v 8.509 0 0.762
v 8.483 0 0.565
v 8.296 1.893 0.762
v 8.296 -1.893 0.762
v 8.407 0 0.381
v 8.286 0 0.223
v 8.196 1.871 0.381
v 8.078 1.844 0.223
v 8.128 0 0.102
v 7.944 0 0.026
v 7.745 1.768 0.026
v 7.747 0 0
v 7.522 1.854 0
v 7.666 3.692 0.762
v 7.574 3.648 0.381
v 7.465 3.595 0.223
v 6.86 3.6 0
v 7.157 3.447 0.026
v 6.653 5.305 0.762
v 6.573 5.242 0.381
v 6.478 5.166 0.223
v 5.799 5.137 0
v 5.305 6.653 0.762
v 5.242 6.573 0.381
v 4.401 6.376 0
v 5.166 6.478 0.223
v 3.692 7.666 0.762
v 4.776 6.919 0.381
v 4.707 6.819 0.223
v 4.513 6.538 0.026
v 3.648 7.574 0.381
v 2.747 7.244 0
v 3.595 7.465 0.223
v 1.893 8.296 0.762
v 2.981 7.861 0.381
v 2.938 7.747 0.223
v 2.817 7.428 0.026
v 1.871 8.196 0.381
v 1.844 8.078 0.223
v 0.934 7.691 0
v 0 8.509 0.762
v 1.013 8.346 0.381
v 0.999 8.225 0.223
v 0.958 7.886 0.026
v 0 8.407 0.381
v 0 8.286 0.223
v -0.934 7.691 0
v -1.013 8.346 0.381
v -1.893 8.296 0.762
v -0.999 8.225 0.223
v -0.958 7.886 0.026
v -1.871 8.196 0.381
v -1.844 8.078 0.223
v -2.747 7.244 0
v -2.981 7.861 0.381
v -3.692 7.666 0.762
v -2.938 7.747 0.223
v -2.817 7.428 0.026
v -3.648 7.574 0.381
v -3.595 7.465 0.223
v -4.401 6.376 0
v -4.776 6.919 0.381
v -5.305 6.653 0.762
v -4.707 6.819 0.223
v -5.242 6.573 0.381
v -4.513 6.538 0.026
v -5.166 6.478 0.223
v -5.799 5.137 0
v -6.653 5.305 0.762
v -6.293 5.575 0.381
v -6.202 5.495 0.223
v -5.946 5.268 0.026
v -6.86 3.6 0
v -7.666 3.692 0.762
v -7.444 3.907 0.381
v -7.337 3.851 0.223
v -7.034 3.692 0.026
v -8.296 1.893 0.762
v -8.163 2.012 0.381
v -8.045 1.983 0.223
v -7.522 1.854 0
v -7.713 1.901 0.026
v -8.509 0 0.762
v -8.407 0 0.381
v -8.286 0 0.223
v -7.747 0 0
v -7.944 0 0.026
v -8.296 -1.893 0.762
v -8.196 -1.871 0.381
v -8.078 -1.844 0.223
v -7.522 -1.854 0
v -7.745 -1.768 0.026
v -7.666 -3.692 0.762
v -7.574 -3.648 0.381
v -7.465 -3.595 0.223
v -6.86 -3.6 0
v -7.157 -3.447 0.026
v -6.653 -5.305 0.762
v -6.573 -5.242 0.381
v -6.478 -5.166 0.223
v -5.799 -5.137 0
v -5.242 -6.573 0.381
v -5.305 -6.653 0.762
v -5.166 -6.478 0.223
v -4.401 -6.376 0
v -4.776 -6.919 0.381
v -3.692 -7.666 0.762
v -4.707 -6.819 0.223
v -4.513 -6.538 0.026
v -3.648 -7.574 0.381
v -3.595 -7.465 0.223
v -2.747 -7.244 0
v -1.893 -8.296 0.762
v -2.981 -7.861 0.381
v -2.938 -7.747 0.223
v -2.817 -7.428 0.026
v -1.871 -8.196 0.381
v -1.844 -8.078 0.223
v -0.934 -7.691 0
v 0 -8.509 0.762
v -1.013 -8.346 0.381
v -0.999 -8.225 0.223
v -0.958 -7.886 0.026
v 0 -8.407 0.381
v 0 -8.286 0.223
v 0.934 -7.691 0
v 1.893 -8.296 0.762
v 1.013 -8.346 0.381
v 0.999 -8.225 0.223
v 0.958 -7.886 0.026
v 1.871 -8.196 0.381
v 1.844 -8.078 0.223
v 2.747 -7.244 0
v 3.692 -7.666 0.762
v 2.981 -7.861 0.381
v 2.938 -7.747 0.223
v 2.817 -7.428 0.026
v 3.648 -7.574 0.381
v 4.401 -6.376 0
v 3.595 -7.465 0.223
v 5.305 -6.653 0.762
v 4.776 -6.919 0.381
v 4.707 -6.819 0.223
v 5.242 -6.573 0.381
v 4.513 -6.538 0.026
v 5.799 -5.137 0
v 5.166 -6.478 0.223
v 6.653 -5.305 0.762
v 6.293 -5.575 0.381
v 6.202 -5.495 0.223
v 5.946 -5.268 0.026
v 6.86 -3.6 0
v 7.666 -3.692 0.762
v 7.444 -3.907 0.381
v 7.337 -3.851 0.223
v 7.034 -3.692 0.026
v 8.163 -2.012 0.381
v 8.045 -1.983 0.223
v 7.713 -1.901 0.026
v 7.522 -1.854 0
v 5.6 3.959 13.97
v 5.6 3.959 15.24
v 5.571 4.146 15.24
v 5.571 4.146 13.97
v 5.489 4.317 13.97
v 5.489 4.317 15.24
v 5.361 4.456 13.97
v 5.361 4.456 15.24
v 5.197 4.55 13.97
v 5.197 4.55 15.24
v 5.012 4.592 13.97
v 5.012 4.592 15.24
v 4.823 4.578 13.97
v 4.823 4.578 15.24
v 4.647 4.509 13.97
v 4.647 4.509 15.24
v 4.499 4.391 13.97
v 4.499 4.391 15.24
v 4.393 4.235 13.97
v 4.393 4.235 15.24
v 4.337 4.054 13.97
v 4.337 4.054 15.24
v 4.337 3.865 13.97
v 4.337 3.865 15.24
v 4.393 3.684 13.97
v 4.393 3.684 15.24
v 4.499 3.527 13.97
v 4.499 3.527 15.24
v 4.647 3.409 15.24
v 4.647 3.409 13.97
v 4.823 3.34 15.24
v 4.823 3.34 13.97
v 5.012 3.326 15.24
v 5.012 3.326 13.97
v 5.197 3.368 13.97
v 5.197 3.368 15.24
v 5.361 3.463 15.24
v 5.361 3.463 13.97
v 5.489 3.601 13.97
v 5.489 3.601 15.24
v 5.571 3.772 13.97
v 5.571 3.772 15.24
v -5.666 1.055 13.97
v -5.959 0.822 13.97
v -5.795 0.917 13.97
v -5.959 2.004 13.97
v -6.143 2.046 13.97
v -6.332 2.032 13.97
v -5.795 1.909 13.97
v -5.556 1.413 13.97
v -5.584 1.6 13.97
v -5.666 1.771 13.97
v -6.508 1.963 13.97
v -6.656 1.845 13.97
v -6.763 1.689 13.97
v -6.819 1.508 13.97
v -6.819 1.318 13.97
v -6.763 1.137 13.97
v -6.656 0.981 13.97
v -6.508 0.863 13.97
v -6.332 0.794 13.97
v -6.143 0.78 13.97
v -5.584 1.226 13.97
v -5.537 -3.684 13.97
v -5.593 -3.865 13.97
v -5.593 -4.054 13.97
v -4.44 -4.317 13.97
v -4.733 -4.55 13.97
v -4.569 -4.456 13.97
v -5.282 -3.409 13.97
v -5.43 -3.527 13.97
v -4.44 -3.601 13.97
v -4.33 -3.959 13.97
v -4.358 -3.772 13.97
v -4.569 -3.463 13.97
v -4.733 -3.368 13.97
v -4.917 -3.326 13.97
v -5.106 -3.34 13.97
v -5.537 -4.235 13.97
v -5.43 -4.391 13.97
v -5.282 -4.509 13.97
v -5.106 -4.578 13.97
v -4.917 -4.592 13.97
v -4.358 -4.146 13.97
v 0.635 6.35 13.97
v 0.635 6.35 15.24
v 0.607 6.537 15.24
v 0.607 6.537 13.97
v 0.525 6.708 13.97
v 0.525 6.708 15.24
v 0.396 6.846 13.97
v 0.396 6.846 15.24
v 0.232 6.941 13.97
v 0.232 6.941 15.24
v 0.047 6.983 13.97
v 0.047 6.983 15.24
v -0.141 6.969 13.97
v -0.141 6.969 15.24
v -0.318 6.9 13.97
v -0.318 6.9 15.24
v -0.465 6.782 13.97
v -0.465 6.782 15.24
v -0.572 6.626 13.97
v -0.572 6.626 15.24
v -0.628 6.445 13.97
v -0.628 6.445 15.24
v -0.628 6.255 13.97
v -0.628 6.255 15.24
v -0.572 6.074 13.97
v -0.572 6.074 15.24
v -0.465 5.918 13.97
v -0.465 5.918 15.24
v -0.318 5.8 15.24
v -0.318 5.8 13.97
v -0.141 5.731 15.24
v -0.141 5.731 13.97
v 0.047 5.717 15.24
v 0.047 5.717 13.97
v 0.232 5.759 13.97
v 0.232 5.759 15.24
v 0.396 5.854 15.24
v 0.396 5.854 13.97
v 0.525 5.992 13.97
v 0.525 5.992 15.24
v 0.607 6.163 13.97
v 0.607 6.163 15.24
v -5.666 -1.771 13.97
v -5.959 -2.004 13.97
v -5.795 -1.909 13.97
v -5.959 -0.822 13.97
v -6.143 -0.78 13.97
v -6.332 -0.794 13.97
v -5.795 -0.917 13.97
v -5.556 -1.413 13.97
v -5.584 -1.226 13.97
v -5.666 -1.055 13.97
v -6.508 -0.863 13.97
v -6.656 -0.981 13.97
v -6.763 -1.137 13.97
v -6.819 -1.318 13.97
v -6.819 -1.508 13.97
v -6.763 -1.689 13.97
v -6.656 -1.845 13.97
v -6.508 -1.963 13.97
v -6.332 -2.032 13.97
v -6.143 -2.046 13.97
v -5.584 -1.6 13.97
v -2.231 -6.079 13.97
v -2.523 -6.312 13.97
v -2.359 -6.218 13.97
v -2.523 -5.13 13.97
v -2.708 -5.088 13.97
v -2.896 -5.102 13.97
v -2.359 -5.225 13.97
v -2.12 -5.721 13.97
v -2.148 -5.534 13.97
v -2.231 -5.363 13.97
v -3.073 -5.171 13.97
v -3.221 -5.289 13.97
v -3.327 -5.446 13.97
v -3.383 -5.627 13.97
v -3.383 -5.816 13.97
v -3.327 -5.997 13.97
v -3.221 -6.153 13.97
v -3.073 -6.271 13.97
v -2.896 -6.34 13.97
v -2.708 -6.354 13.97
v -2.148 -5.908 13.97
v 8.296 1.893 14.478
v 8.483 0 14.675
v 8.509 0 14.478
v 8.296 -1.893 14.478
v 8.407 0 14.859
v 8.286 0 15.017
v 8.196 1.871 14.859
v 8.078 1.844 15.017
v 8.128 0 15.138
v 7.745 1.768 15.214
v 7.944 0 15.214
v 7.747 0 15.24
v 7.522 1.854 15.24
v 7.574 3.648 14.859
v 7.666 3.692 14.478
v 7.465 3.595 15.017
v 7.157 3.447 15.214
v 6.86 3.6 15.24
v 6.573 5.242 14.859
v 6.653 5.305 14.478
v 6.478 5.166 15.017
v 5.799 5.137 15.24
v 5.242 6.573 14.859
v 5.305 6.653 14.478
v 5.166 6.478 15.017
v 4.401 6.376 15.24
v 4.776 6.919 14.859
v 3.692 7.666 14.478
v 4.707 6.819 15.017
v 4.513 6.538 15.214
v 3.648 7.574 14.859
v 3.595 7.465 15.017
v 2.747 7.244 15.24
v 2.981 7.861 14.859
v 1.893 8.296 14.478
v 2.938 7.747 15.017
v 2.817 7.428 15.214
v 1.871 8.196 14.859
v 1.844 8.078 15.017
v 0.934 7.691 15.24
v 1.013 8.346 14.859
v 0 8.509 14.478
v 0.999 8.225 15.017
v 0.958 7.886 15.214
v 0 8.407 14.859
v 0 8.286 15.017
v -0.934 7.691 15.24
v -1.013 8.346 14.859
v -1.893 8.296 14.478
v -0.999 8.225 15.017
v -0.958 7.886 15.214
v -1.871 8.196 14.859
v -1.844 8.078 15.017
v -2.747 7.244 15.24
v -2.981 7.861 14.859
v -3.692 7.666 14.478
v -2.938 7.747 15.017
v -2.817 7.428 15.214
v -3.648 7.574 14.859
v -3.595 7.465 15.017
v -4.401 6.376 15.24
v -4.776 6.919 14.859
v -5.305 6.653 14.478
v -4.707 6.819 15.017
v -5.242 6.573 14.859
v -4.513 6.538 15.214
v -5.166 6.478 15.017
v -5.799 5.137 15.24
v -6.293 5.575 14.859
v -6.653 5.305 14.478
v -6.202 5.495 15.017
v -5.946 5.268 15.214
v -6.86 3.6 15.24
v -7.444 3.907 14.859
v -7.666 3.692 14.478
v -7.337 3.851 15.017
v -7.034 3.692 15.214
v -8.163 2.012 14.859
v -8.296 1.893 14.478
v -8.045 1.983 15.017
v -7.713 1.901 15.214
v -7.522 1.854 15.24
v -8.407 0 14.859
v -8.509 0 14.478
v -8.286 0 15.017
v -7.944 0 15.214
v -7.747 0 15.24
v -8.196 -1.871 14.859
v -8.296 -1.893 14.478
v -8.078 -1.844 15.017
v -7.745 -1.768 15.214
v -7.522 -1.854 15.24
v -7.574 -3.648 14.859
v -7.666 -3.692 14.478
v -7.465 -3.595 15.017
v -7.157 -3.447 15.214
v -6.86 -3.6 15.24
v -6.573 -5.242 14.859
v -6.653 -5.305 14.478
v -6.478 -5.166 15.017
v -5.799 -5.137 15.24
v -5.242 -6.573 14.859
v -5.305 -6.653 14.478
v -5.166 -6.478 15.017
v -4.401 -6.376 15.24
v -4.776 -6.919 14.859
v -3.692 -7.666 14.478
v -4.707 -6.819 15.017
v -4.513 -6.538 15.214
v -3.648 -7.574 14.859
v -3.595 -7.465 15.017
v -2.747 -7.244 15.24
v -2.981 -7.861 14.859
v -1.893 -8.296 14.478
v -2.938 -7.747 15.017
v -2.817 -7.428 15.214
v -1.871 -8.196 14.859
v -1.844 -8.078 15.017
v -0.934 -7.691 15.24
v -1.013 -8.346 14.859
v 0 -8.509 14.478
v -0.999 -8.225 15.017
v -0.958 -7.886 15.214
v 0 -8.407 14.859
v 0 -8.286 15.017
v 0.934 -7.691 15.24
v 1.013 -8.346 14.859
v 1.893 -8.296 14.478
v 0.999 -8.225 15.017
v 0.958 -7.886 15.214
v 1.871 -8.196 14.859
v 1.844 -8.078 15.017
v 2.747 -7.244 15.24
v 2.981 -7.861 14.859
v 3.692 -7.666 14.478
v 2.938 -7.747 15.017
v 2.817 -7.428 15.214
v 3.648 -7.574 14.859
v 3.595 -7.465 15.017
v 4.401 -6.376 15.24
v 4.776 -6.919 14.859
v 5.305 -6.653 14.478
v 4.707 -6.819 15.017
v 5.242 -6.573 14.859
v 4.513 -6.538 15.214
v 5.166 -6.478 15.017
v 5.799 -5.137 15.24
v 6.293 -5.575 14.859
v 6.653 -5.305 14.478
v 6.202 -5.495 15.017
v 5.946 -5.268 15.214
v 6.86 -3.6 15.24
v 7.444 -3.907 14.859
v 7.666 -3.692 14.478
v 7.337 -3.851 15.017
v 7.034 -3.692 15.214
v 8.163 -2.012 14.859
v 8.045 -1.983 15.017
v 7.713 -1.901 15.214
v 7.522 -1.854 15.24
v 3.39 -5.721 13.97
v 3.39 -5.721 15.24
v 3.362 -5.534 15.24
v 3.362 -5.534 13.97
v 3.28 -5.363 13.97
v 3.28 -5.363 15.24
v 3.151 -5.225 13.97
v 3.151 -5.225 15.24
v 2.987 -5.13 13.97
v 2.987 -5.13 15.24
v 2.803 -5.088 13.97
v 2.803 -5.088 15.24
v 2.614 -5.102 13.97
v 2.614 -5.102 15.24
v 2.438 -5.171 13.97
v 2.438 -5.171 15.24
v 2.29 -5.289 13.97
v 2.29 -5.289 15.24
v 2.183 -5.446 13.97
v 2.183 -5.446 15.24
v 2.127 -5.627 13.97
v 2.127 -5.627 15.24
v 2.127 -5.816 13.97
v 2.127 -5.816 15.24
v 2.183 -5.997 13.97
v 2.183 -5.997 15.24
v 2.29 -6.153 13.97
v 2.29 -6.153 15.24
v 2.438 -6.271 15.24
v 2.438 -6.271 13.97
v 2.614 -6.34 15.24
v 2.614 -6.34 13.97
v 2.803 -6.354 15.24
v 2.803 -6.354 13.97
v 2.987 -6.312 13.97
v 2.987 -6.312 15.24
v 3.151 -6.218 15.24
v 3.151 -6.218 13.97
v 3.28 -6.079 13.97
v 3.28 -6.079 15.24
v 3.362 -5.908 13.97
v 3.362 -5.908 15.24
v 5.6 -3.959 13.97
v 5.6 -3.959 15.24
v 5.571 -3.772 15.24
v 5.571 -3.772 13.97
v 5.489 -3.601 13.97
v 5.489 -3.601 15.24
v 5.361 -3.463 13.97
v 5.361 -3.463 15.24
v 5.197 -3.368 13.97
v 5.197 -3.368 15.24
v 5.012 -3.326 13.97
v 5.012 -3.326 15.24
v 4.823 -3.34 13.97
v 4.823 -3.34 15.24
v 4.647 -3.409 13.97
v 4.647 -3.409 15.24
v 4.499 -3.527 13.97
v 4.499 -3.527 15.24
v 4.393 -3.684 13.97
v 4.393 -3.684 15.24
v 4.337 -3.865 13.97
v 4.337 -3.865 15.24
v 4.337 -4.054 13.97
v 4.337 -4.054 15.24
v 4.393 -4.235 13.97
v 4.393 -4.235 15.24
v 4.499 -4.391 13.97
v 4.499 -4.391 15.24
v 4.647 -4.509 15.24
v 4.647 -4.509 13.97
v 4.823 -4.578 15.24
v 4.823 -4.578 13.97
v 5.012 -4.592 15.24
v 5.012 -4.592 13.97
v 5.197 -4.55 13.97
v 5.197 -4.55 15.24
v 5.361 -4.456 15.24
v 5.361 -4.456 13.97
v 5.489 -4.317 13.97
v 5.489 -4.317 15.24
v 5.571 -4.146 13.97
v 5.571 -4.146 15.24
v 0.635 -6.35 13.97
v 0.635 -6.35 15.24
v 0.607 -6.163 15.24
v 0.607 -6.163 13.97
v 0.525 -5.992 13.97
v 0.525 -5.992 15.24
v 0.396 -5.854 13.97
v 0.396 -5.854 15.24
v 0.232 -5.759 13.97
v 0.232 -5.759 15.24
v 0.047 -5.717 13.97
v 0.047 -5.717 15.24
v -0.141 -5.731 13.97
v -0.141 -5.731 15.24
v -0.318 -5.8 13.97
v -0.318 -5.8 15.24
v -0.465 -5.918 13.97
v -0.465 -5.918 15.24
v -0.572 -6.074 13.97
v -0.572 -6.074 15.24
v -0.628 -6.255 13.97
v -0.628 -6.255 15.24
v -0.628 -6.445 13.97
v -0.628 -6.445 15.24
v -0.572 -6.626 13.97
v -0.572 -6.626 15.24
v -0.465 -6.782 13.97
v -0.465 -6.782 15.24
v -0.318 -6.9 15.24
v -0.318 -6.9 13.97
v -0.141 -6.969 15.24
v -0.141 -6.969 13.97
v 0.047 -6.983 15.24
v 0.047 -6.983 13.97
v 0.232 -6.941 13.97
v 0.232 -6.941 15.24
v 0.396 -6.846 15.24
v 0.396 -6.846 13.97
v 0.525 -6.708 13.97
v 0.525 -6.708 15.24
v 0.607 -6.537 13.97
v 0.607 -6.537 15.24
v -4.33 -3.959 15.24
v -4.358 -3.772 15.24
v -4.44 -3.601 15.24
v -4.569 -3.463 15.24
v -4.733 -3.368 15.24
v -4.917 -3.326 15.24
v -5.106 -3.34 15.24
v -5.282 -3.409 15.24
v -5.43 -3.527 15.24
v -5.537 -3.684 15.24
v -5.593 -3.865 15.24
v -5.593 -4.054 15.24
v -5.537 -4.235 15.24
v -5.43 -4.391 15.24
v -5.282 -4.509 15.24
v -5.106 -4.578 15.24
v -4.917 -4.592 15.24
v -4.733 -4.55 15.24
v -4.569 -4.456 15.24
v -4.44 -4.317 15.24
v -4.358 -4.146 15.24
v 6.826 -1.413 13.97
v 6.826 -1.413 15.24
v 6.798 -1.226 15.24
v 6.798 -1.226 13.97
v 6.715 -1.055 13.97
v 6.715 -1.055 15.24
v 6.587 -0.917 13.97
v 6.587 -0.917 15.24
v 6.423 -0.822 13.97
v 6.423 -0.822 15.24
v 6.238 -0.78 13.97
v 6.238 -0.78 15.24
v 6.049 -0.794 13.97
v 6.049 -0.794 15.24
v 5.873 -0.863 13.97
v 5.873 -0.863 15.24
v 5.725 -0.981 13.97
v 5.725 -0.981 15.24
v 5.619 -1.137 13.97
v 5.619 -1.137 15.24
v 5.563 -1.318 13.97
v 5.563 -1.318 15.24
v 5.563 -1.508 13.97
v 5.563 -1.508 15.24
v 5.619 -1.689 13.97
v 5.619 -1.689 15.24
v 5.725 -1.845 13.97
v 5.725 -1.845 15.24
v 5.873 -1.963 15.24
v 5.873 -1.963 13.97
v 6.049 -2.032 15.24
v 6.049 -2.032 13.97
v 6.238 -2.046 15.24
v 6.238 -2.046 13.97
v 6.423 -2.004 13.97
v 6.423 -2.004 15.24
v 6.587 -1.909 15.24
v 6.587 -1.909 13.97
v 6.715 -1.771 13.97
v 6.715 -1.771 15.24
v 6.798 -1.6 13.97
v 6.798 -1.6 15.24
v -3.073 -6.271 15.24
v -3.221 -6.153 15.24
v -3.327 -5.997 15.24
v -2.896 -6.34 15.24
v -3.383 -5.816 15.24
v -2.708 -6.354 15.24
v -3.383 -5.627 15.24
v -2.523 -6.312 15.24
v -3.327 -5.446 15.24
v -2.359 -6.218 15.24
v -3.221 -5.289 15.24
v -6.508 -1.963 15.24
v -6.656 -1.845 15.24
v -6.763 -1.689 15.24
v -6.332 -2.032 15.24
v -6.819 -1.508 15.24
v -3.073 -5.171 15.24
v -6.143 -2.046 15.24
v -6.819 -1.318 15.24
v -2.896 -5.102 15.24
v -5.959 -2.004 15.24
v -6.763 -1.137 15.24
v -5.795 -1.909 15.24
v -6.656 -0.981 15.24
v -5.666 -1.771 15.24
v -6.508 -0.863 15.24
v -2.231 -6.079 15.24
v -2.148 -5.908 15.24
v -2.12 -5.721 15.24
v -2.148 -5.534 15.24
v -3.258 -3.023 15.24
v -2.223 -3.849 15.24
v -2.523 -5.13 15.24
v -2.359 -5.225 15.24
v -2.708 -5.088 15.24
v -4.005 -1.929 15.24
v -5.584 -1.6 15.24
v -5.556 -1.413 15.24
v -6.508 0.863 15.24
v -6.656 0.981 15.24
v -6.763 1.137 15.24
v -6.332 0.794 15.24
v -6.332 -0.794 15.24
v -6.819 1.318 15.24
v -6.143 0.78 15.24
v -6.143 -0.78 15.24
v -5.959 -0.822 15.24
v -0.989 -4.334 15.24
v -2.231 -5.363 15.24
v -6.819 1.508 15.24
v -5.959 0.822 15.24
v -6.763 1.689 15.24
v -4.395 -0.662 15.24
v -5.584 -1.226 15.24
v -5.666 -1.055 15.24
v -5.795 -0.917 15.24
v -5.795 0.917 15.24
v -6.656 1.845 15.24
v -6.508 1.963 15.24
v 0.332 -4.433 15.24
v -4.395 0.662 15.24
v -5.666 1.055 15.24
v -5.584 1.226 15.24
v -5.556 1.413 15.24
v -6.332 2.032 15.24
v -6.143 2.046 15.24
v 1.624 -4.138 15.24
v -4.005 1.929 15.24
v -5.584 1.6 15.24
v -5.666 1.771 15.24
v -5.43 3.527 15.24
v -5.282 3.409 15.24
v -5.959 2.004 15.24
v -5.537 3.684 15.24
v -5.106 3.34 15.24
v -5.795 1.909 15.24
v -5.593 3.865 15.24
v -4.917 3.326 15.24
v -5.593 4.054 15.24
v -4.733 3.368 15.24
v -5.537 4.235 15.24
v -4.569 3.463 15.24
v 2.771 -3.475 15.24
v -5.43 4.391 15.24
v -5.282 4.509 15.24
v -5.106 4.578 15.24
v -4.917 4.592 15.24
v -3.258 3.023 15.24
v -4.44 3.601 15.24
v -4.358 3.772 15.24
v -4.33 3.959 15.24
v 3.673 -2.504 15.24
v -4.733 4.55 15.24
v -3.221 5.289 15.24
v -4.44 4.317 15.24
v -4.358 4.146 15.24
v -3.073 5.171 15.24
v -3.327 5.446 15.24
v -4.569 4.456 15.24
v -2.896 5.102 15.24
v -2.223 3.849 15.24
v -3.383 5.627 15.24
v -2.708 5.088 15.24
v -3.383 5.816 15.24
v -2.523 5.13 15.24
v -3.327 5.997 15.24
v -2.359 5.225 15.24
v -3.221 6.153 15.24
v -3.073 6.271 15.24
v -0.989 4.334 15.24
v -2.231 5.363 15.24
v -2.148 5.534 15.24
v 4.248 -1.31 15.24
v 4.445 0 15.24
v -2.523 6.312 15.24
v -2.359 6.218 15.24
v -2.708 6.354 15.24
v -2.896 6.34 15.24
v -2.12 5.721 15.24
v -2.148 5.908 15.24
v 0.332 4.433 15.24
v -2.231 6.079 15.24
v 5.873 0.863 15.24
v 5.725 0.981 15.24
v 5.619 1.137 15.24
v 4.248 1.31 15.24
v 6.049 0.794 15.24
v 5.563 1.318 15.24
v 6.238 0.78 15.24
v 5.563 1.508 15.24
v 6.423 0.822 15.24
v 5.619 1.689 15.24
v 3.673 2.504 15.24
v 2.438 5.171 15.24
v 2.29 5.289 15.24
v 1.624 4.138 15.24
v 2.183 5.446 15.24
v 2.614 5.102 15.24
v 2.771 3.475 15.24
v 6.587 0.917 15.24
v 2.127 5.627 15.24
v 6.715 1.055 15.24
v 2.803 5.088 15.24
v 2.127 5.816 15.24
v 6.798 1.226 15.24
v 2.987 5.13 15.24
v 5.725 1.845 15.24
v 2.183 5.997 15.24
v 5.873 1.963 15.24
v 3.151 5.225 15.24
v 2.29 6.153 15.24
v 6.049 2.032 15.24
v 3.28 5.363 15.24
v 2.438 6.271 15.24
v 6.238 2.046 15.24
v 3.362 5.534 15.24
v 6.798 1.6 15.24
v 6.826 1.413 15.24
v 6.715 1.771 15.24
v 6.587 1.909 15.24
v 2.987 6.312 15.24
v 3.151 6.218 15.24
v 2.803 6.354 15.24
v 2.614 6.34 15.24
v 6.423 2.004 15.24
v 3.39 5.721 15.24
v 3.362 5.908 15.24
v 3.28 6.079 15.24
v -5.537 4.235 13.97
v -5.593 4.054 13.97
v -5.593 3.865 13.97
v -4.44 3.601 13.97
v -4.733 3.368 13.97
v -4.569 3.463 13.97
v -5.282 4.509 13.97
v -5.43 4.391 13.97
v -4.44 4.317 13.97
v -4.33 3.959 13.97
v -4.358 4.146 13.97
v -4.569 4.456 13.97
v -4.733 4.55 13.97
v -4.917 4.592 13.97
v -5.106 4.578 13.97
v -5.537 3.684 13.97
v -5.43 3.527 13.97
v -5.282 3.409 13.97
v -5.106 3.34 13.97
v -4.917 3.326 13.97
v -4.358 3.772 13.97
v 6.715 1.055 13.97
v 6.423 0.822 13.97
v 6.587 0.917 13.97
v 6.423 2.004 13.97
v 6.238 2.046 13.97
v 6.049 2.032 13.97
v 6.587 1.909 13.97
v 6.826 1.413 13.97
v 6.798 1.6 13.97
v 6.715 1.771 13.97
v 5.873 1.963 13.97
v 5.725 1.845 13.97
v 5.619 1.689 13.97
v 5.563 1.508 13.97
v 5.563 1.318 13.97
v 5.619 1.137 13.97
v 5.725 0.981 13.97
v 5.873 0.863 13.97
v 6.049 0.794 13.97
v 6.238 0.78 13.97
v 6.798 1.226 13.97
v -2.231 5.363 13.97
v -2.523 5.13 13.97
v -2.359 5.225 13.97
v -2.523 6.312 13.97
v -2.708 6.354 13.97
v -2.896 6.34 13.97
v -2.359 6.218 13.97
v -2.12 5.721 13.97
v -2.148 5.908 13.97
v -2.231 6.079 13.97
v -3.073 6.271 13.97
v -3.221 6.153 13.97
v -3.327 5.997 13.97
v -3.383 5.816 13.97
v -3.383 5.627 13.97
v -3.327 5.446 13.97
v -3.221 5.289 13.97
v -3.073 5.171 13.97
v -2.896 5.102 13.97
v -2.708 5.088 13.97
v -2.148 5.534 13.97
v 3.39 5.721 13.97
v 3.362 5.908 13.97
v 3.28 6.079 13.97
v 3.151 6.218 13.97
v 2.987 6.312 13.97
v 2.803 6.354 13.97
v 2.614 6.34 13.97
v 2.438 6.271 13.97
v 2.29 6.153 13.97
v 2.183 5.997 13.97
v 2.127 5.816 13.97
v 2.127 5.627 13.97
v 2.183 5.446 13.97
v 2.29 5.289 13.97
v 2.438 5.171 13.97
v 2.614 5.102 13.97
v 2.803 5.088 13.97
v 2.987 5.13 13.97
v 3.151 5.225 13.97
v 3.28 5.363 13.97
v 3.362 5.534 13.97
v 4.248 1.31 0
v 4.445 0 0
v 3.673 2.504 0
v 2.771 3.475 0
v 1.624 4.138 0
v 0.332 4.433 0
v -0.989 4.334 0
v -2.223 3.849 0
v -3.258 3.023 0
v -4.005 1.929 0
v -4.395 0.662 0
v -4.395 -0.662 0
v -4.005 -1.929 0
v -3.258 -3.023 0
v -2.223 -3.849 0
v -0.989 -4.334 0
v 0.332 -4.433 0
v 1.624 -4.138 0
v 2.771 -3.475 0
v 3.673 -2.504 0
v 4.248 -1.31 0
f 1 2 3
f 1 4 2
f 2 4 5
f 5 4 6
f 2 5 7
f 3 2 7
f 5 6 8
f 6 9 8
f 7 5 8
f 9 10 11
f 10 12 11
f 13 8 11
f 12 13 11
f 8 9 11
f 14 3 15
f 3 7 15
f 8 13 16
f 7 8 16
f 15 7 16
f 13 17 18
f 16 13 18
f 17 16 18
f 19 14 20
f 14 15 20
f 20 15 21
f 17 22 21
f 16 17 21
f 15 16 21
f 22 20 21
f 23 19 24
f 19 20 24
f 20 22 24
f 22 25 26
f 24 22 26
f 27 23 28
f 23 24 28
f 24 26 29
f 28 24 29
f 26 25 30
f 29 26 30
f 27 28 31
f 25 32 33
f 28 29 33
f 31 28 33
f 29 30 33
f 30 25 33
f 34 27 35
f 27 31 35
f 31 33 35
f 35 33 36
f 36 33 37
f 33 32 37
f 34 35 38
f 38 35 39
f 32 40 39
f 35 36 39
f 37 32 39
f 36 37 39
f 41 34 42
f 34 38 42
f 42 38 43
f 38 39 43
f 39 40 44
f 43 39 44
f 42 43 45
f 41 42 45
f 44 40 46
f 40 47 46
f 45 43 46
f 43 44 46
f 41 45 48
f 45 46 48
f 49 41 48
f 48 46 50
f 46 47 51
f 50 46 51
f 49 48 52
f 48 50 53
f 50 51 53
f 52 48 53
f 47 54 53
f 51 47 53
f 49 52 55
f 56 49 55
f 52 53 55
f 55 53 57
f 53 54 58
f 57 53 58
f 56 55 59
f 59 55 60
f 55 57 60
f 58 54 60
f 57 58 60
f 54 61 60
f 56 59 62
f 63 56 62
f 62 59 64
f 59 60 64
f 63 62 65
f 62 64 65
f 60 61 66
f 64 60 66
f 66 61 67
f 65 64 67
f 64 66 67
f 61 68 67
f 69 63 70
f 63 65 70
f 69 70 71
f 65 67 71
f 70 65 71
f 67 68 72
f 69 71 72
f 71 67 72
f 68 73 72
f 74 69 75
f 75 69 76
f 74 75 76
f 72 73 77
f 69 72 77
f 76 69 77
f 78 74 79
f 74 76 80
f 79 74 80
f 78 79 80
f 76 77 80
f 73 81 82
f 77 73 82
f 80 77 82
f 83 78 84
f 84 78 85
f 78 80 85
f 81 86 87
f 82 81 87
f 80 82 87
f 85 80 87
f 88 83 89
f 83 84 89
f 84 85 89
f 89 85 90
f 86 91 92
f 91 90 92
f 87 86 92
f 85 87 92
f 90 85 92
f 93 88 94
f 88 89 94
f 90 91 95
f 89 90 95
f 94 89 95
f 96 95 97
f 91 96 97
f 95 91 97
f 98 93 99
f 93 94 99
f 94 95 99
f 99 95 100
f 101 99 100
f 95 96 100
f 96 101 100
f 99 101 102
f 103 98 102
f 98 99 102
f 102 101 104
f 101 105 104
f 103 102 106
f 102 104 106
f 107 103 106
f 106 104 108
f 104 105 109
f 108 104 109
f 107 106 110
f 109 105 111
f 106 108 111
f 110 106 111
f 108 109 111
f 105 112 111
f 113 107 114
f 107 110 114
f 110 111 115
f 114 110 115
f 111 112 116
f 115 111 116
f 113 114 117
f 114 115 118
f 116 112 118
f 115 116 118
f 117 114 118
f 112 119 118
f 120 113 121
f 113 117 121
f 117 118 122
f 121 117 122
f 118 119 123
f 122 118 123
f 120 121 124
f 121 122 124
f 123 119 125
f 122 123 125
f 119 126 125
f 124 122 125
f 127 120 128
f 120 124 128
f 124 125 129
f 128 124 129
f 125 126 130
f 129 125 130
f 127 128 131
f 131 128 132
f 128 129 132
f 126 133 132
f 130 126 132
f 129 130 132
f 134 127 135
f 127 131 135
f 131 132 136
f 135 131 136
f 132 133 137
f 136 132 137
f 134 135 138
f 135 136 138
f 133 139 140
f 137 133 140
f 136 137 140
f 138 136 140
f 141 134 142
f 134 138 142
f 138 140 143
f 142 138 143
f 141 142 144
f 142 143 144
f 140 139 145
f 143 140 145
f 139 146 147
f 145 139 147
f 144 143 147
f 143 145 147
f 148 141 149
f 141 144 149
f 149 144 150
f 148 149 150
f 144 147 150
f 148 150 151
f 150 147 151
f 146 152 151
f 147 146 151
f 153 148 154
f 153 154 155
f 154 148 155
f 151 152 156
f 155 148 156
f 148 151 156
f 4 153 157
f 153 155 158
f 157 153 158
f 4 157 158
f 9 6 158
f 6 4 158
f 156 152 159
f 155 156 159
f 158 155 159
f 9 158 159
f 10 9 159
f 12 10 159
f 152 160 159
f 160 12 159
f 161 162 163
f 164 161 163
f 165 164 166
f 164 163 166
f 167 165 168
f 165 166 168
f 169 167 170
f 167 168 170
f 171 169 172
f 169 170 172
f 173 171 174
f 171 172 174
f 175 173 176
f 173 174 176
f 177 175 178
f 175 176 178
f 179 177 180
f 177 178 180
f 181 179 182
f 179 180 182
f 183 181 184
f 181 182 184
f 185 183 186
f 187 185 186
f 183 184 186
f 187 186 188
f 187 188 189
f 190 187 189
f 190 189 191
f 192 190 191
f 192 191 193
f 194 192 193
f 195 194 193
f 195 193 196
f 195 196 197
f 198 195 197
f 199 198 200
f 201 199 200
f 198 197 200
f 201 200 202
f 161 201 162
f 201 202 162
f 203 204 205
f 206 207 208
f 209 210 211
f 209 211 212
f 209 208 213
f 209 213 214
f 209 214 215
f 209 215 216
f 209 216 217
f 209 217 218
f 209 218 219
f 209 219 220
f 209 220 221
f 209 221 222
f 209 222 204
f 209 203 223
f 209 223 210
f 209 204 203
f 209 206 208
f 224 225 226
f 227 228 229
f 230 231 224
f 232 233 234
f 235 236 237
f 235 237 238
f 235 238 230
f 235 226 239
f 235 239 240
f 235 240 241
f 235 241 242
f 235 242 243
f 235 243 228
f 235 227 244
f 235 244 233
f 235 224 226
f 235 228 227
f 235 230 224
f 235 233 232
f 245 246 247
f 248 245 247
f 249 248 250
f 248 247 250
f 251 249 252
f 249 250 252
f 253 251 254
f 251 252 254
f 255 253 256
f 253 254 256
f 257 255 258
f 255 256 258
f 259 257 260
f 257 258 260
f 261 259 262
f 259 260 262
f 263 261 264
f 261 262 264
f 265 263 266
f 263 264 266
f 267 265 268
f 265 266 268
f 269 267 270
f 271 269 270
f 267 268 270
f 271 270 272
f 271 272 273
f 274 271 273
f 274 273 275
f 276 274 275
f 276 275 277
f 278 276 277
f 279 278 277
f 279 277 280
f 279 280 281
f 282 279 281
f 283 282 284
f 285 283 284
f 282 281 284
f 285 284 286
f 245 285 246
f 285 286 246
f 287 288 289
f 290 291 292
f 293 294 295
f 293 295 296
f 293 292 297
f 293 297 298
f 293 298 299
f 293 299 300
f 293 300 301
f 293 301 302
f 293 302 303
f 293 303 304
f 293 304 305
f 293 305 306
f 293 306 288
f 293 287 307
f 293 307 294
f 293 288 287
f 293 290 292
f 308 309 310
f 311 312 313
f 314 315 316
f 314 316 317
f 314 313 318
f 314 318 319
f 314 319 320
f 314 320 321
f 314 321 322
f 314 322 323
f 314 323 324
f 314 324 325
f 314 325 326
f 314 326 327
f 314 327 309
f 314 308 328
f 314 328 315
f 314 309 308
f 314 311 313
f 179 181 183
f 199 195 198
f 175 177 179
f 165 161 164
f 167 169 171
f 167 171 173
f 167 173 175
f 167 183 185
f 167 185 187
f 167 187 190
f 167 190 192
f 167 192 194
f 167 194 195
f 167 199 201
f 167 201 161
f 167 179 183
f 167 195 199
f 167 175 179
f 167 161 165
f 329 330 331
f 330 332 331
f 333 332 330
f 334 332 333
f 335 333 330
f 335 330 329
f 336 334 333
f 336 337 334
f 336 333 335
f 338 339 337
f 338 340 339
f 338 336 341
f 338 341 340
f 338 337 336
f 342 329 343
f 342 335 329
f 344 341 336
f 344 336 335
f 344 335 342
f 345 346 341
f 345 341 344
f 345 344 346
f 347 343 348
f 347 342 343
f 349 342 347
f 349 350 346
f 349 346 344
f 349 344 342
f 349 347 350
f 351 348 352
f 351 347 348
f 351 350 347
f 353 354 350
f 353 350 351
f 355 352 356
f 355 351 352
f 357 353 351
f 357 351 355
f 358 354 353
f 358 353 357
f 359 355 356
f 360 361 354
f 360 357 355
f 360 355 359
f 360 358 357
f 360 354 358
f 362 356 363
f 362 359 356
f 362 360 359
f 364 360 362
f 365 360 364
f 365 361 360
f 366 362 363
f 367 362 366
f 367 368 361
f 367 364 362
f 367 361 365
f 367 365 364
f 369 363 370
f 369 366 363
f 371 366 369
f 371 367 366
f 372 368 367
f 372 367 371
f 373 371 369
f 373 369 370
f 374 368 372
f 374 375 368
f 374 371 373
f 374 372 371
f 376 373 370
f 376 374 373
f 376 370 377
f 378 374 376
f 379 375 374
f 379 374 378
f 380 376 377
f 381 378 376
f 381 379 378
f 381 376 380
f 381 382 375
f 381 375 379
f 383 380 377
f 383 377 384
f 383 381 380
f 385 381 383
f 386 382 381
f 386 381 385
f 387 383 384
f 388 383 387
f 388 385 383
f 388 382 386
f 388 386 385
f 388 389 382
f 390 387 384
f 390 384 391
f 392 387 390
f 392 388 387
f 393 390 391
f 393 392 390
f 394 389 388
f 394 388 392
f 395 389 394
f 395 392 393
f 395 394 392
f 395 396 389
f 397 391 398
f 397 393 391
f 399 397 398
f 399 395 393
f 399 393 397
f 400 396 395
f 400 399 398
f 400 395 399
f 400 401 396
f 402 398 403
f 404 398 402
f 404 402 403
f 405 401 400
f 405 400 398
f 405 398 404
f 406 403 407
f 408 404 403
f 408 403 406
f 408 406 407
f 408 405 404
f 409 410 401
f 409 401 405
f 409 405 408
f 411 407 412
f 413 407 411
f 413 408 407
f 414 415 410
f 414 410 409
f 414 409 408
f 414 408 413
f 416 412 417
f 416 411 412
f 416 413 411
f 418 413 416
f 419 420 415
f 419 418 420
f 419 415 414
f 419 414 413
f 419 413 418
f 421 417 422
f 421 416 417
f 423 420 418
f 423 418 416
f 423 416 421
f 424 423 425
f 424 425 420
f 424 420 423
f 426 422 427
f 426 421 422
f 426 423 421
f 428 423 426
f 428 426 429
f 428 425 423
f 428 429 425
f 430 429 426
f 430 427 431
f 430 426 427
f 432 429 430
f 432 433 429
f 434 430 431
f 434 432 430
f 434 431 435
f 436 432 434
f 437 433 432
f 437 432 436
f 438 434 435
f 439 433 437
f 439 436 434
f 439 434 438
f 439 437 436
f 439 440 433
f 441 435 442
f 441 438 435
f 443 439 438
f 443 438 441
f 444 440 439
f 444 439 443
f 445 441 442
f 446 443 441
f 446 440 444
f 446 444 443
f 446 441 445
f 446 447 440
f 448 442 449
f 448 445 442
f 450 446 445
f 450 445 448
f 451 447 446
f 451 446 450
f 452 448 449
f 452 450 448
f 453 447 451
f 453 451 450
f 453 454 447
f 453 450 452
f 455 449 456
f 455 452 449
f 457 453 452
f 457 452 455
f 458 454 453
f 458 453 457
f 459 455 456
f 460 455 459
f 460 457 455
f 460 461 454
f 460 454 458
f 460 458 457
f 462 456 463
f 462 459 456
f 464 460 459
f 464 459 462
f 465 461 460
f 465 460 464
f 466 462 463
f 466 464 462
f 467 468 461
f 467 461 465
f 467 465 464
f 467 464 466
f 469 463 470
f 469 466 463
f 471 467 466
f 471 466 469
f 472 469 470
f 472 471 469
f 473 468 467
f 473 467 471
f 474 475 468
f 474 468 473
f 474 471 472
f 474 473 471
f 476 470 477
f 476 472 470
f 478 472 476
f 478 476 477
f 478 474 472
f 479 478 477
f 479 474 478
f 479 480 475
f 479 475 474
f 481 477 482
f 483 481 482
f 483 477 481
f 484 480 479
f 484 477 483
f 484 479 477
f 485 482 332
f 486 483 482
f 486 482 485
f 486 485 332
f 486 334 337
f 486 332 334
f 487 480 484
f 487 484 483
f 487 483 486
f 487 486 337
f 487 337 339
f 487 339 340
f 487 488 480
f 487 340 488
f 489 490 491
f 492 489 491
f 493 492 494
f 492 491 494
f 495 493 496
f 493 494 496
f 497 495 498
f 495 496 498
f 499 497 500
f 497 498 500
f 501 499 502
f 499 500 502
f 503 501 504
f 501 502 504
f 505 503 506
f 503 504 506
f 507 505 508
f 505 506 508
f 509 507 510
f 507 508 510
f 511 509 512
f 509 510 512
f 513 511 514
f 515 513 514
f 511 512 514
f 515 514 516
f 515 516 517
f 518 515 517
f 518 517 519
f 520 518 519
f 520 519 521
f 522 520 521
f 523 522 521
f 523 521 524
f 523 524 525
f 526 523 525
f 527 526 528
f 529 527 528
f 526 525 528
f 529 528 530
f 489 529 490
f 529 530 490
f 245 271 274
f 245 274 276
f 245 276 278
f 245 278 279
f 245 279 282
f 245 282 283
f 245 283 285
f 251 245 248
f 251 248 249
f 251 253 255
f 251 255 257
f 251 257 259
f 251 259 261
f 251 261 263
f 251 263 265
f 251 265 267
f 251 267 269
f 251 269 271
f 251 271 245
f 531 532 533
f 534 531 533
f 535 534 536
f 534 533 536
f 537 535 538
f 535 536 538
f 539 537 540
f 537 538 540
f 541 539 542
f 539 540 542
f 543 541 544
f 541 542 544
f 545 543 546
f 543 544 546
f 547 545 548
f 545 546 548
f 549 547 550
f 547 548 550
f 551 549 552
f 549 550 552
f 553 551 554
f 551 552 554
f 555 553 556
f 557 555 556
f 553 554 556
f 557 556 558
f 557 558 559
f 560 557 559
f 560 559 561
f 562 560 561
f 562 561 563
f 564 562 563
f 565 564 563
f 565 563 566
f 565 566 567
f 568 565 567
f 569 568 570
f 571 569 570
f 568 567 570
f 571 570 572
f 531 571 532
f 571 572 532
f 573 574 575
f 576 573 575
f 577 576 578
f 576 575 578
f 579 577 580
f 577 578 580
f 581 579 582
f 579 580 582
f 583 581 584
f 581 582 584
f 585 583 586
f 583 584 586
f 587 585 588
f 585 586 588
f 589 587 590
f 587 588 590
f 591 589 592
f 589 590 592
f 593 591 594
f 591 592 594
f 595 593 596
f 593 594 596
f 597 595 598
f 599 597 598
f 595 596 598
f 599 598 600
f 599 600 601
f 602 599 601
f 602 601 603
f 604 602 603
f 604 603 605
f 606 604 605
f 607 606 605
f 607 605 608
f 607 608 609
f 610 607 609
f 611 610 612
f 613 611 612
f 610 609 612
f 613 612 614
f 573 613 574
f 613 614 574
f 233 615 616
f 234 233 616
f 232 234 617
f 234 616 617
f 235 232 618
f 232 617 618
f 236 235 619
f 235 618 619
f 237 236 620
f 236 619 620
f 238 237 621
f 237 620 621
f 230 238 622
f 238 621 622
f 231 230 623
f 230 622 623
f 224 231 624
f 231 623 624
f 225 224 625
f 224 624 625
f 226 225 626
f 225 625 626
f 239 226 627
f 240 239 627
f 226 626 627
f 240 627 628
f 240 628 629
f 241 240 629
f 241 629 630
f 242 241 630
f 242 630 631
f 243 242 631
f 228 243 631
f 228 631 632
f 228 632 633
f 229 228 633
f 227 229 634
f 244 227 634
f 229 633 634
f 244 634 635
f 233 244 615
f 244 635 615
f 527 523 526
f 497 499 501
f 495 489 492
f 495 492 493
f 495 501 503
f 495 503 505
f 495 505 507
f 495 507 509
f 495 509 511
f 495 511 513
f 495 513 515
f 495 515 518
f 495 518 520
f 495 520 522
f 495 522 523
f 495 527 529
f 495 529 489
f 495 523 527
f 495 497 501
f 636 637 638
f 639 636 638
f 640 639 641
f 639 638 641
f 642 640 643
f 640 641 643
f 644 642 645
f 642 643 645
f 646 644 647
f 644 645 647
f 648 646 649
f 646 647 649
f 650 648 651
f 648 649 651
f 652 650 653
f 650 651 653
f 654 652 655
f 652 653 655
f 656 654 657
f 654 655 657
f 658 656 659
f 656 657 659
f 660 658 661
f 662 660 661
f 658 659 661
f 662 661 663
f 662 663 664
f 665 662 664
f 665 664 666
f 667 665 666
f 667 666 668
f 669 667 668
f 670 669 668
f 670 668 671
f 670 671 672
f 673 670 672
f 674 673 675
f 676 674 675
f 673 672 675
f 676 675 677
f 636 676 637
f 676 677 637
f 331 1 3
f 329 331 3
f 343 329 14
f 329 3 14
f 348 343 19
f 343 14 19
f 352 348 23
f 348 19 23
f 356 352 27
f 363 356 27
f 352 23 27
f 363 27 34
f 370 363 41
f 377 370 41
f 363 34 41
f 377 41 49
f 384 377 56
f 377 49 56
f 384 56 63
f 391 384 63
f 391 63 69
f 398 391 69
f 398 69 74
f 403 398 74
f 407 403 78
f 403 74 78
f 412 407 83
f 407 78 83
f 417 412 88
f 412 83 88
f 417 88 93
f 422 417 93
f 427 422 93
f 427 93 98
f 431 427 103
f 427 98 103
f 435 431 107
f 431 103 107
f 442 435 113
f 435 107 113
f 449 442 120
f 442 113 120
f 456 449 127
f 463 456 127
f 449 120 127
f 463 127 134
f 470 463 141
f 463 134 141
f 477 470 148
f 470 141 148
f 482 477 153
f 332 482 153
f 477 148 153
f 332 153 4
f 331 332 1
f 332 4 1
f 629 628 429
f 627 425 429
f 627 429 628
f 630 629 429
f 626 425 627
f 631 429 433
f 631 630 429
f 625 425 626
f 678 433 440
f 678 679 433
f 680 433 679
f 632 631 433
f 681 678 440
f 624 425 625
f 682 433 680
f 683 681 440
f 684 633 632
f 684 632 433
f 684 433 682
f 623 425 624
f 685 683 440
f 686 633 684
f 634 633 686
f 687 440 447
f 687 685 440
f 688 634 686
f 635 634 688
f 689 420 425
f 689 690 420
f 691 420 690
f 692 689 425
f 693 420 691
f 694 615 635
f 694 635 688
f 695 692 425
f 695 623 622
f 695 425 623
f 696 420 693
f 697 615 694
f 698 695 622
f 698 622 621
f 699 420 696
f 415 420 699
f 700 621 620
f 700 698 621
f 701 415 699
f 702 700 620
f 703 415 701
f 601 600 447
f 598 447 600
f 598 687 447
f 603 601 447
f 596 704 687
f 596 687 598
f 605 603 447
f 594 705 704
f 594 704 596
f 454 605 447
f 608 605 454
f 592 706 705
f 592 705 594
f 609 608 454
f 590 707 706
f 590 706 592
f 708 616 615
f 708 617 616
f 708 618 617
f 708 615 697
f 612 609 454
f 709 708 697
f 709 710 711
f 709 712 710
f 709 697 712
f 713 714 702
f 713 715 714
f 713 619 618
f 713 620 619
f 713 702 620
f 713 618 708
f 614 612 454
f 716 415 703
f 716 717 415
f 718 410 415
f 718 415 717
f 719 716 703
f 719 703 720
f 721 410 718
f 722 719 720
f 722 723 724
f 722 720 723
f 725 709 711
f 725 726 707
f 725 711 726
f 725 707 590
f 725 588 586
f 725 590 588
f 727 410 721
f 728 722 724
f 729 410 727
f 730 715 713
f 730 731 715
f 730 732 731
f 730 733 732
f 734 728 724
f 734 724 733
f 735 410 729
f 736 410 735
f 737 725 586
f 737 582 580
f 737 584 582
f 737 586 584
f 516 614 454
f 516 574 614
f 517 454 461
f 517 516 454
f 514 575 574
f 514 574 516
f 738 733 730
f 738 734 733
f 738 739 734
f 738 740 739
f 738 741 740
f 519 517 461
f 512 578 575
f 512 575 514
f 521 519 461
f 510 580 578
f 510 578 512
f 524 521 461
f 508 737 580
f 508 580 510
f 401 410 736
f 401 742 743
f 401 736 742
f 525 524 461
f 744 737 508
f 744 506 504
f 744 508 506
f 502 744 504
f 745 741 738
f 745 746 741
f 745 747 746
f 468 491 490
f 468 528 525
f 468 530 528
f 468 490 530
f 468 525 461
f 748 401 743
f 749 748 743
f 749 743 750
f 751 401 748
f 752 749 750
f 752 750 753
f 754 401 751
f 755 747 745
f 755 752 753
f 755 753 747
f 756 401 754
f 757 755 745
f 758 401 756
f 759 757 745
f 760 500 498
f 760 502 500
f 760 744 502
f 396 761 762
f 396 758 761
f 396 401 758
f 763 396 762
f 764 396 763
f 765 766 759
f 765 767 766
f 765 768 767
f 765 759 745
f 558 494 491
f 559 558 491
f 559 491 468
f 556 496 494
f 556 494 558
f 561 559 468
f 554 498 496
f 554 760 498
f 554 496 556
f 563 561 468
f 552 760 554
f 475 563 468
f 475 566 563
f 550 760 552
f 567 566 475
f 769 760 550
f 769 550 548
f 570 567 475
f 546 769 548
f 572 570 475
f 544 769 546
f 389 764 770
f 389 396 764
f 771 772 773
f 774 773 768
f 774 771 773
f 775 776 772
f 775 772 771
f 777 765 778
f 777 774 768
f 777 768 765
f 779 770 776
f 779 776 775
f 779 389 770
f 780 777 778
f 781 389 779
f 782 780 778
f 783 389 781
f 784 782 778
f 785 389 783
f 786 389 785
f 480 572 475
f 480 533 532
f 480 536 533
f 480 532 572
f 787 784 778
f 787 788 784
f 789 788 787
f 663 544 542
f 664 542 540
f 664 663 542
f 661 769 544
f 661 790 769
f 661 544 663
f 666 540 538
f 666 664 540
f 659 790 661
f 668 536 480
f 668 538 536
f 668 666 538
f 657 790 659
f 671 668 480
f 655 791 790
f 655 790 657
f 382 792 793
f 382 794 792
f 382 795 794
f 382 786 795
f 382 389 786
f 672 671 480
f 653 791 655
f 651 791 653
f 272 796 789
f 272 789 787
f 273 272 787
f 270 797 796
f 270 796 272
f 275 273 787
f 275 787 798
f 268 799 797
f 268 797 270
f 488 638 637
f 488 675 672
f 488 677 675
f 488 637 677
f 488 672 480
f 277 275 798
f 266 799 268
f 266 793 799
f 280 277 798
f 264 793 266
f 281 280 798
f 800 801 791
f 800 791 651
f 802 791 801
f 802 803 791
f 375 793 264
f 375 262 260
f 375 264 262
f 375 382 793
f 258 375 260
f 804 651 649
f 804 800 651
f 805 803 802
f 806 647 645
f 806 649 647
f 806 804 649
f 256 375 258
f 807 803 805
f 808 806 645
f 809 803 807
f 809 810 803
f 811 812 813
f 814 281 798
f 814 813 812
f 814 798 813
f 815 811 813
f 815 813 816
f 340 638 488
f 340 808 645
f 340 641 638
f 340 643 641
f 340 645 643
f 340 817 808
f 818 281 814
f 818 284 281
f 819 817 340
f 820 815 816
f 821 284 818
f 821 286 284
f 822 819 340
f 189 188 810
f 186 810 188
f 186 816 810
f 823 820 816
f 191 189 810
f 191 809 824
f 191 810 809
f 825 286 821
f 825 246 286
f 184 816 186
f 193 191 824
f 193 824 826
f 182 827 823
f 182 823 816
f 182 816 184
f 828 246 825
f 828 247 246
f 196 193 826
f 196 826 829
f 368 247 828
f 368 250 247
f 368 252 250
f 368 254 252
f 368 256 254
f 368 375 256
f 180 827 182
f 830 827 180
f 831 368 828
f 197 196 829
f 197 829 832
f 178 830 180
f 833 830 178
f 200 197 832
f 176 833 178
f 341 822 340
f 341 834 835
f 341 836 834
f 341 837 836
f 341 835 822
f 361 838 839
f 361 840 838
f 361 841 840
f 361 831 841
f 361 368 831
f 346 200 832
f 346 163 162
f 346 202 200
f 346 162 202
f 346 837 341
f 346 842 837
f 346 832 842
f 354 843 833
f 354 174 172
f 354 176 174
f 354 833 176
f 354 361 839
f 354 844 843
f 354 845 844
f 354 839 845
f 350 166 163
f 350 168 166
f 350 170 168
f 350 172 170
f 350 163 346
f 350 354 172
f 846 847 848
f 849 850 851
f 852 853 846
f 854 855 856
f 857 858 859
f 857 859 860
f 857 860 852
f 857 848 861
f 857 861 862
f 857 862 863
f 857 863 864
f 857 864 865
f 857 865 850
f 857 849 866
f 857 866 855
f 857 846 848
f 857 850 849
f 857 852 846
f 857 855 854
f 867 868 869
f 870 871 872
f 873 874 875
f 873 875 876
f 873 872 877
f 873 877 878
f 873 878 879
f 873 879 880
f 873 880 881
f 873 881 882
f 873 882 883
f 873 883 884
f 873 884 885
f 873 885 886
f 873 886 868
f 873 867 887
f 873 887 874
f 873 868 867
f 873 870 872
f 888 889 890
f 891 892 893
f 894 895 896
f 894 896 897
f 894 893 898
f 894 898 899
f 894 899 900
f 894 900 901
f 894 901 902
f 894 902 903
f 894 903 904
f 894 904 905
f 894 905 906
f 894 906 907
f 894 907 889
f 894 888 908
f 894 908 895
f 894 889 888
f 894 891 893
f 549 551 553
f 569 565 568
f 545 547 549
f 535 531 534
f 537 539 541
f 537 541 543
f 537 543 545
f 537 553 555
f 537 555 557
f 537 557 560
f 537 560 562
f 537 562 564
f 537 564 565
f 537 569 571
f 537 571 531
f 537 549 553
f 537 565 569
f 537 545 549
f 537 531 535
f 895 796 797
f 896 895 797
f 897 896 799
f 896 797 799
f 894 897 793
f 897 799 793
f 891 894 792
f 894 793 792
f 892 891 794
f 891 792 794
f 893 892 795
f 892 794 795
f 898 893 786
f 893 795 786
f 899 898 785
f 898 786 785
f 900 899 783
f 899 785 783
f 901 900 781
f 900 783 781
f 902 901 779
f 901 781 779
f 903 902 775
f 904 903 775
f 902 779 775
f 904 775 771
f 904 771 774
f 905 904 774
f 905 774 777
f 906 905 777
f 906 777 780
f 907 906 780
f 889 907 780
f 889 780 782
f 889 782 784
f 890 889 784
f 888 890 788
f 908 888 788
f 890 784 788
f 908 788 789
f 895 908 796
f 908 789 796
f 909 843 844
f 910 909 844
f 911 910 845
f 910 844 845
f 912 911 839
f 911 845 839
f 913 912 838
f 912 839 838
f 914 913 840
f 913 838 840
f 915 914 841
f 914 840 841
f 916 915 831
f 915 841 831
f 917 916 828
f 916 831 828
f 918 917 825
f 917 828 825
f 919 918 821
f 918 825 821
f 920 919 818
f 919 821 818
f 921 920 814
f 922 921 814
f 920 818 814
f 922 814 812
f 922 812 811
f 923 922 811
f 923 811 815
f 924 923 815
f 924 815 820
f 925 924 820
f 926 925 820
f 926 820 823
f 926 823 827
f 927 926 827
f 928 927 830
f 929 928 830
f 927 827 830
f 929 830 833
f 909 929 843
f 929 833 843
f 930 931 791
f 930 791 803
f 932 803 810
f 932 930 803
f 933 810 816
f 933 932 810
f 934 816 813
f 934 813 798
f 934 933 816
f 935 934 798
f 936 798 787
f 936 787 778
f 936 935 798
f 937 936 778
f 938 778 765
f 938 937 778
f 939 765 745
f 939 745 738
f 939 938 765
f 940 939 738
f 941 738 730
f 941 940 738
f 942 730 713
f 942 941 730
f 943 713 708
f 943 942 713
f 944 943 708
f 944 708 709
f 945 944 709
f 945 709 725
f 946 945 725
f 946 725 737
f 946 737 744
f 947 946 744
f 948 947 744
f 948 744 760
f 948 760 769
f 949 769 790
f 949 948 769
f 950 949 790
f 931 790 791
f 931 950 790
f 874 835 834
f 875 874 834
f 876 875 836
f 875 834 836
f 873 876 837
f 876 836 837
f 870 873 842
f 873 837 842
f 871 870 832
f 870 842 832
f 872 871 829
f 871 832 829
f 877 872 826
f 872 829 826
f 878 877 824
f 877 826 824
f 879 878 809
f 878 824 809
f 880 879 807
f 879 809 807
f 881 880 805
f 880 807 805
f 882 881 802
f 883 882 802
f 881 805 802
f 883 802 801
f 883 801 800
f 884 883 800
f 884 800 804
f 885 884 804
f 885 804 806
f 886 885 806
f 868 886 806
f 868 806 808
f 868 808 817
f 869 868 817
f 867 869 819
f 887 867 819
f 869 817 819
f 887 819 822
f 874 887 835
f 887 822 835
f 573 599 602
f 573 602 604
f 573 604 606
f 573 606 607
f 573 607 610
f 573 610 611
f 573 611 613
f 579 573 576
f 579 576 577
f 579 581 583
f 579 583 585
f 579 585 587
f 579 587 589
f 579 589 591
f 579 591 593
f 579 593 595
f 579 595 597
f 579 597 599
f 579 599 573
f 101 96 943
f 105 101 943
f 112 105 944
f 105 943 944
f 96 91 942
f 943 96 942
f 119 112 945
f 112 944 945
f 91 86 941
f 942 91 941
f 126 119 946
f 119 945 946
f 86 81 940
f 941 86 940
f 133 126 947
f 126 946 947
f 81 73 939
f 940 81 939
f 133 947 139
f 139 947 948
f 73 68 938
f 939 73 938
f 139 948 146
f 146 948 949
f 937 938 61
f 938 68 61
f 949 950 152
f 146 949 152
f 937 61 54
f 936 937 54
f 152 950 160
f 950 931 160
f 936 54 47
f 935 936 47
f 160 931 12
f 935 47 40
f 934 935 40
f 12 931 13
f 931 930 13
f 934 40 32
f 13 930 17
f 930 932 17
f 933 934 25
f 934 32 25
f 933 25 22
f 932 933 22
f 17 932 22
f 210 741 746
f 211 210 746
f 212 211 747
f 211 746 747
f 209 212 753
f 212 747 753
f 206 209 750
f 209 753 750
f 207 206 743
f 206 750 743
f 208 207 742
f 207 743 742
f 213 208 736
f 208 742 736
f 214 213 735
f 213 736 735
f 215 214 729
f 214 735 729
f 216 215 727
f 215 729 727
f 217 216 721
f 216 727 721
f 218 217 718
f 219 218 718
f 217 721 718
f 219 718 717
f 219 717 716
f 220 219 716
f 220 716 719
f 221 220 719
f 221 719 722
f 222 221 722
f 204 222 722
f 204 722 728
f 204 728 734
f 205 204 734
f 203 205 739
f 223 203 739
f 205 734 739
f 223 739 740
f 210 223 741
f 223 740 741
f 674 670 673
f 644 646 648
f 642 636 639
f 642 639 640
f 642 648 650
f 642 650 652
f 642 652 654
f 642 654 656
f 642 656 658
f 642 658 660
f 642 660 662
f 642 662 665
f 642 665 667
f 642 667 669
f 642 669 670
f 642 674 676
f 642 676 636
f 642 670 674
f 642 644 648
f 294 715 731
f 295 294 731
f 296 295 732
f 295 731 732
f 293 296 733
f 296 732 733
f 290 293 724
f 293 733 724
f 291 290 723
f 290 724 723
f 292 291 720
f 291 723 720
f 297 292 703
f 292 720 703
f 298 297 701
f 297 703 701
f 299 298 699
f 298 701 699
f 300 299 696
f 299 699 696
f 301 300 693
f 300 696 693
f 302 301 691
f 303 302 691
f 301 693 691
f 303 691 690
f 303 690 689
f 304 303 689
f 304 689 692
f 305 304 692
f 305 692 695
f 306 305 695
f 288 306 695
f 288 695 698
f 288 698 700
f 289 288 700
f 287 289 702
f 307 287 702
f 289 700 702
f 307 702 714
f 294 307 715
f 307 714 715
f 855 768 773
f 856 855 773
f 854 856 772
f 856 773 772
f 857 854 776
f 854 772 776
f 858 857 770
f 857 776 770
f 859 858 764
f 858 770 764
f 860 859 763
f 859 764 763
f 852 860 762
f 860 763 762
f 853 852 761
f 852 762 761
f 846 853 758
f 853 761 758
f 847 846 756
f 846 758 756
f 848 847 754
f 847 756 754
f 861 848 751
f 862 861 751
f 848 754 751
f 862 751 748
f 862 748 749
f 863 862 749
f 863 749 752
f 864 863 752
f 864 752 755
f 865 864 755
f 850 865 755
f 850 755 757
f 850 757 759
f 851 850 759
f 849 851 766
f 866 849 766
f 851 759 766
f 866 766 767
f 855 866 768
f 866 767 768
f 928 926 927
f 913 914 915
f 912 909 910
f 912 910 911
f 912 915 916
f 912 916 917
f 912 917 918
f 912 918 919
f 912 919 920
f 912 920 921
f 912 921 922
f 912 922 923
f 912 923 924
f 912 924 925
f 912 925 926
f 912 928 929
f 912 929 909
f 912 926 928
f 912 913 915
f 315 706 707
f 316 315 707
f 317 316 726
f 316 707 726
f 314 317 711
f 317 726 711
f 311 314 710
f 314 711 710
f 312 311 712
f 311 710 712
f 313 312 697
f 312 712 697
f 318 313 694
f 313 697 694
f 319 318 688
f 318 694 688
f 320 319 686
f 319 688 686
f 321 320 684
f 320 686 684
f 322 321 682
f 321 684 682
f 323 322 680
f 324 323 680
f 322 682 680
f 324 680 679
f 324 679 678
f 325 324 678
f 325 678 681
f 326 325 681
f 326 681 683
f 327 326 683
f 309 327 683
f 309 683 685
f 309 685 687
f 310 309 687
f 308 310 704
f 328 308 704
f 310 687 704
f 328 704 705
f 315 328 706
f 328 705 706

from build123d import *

# Parameters (mm, degrees)
SKETCH1_R           = 8.509
SKETCH1_R_2         = 4.445
BOSS_EXTRUDE1_DEPTH = 15.24
FILLET1_R           = 0.762
SKETCH2_R           = 0.635
CUT_EXTRUDE1_DEPTH  = 1.27


with BuildPart() as part:
    # Sketch1 → Boss-Extrude1 (new body)
    with BuildSketch(Plane.XY):
        Circle(SKETCH1_R)
        Circle(SKETCH1_R_2, mode=Mode.SUBTRACT)
    extrude(amount=BOSS_EXTRUDE1_DEPTH)

    # Fillet1
    fillet1_edges = [part.edges().sort_by_distance(p)[0] for p in [
        (-8.509, 0, 0),
        (-8.509, 0, 15.24),
    ]]
    fillet(fillet1_edges, radius=FILLET1_R)

    # Sketch2 → Cut-Extrude1 (cut)
    with BuildSketch(Plane.XY.offset(15.24)):
        with Locations((0, 6.35)):
            Circle(SKETCH2_R)
        with Locations((2.755161743, 5.721152311)):
            Circle(SKETCH2_R)
        with Locations((4.964629914, 3.959160242)):
            Circle(SKETCH2_R)
        with Locations((6.190792242, 1.413007931)):
            Circle(SKETCH2_R)
        with Locations((6.190792242, -1.413007931)):
            Circle(SKETCH2_R)
        with Locations((4.964629914, -3.959160242)):
            Circle(SKETCH2_R)
        with Locations((2.755161743, -5.721152311)):
            Circle(SKETCH2_R)
        with Locations((0, -6.35)):
            Circle(SKETCH2_R)
        with Locations((-2.755161743, -5.721152311)):
            Circle(SKETCH2_R)
        with Locations((-4.964629914, -3.959160242)):
            Circle(SKETCH2_R)
        with Locations((-6.190792242, -1.413007931)):
            Circle(SKETCH2_R)
        with Locations((-6.190792242, 1.413007931)):
            Circle(SKETCH2_R)
        with Locations((-4.964629914, 3.959160242)):
            Circle(SKETCH2_R)
        with Locations((-2.755161743, 5.721152311)):
            Circle(SKETCH2_R)
    extrude(amount=-CUT_EXTRUDE1_DEPTH, mode=Mode.SUBTRACT)


solid = part.part
